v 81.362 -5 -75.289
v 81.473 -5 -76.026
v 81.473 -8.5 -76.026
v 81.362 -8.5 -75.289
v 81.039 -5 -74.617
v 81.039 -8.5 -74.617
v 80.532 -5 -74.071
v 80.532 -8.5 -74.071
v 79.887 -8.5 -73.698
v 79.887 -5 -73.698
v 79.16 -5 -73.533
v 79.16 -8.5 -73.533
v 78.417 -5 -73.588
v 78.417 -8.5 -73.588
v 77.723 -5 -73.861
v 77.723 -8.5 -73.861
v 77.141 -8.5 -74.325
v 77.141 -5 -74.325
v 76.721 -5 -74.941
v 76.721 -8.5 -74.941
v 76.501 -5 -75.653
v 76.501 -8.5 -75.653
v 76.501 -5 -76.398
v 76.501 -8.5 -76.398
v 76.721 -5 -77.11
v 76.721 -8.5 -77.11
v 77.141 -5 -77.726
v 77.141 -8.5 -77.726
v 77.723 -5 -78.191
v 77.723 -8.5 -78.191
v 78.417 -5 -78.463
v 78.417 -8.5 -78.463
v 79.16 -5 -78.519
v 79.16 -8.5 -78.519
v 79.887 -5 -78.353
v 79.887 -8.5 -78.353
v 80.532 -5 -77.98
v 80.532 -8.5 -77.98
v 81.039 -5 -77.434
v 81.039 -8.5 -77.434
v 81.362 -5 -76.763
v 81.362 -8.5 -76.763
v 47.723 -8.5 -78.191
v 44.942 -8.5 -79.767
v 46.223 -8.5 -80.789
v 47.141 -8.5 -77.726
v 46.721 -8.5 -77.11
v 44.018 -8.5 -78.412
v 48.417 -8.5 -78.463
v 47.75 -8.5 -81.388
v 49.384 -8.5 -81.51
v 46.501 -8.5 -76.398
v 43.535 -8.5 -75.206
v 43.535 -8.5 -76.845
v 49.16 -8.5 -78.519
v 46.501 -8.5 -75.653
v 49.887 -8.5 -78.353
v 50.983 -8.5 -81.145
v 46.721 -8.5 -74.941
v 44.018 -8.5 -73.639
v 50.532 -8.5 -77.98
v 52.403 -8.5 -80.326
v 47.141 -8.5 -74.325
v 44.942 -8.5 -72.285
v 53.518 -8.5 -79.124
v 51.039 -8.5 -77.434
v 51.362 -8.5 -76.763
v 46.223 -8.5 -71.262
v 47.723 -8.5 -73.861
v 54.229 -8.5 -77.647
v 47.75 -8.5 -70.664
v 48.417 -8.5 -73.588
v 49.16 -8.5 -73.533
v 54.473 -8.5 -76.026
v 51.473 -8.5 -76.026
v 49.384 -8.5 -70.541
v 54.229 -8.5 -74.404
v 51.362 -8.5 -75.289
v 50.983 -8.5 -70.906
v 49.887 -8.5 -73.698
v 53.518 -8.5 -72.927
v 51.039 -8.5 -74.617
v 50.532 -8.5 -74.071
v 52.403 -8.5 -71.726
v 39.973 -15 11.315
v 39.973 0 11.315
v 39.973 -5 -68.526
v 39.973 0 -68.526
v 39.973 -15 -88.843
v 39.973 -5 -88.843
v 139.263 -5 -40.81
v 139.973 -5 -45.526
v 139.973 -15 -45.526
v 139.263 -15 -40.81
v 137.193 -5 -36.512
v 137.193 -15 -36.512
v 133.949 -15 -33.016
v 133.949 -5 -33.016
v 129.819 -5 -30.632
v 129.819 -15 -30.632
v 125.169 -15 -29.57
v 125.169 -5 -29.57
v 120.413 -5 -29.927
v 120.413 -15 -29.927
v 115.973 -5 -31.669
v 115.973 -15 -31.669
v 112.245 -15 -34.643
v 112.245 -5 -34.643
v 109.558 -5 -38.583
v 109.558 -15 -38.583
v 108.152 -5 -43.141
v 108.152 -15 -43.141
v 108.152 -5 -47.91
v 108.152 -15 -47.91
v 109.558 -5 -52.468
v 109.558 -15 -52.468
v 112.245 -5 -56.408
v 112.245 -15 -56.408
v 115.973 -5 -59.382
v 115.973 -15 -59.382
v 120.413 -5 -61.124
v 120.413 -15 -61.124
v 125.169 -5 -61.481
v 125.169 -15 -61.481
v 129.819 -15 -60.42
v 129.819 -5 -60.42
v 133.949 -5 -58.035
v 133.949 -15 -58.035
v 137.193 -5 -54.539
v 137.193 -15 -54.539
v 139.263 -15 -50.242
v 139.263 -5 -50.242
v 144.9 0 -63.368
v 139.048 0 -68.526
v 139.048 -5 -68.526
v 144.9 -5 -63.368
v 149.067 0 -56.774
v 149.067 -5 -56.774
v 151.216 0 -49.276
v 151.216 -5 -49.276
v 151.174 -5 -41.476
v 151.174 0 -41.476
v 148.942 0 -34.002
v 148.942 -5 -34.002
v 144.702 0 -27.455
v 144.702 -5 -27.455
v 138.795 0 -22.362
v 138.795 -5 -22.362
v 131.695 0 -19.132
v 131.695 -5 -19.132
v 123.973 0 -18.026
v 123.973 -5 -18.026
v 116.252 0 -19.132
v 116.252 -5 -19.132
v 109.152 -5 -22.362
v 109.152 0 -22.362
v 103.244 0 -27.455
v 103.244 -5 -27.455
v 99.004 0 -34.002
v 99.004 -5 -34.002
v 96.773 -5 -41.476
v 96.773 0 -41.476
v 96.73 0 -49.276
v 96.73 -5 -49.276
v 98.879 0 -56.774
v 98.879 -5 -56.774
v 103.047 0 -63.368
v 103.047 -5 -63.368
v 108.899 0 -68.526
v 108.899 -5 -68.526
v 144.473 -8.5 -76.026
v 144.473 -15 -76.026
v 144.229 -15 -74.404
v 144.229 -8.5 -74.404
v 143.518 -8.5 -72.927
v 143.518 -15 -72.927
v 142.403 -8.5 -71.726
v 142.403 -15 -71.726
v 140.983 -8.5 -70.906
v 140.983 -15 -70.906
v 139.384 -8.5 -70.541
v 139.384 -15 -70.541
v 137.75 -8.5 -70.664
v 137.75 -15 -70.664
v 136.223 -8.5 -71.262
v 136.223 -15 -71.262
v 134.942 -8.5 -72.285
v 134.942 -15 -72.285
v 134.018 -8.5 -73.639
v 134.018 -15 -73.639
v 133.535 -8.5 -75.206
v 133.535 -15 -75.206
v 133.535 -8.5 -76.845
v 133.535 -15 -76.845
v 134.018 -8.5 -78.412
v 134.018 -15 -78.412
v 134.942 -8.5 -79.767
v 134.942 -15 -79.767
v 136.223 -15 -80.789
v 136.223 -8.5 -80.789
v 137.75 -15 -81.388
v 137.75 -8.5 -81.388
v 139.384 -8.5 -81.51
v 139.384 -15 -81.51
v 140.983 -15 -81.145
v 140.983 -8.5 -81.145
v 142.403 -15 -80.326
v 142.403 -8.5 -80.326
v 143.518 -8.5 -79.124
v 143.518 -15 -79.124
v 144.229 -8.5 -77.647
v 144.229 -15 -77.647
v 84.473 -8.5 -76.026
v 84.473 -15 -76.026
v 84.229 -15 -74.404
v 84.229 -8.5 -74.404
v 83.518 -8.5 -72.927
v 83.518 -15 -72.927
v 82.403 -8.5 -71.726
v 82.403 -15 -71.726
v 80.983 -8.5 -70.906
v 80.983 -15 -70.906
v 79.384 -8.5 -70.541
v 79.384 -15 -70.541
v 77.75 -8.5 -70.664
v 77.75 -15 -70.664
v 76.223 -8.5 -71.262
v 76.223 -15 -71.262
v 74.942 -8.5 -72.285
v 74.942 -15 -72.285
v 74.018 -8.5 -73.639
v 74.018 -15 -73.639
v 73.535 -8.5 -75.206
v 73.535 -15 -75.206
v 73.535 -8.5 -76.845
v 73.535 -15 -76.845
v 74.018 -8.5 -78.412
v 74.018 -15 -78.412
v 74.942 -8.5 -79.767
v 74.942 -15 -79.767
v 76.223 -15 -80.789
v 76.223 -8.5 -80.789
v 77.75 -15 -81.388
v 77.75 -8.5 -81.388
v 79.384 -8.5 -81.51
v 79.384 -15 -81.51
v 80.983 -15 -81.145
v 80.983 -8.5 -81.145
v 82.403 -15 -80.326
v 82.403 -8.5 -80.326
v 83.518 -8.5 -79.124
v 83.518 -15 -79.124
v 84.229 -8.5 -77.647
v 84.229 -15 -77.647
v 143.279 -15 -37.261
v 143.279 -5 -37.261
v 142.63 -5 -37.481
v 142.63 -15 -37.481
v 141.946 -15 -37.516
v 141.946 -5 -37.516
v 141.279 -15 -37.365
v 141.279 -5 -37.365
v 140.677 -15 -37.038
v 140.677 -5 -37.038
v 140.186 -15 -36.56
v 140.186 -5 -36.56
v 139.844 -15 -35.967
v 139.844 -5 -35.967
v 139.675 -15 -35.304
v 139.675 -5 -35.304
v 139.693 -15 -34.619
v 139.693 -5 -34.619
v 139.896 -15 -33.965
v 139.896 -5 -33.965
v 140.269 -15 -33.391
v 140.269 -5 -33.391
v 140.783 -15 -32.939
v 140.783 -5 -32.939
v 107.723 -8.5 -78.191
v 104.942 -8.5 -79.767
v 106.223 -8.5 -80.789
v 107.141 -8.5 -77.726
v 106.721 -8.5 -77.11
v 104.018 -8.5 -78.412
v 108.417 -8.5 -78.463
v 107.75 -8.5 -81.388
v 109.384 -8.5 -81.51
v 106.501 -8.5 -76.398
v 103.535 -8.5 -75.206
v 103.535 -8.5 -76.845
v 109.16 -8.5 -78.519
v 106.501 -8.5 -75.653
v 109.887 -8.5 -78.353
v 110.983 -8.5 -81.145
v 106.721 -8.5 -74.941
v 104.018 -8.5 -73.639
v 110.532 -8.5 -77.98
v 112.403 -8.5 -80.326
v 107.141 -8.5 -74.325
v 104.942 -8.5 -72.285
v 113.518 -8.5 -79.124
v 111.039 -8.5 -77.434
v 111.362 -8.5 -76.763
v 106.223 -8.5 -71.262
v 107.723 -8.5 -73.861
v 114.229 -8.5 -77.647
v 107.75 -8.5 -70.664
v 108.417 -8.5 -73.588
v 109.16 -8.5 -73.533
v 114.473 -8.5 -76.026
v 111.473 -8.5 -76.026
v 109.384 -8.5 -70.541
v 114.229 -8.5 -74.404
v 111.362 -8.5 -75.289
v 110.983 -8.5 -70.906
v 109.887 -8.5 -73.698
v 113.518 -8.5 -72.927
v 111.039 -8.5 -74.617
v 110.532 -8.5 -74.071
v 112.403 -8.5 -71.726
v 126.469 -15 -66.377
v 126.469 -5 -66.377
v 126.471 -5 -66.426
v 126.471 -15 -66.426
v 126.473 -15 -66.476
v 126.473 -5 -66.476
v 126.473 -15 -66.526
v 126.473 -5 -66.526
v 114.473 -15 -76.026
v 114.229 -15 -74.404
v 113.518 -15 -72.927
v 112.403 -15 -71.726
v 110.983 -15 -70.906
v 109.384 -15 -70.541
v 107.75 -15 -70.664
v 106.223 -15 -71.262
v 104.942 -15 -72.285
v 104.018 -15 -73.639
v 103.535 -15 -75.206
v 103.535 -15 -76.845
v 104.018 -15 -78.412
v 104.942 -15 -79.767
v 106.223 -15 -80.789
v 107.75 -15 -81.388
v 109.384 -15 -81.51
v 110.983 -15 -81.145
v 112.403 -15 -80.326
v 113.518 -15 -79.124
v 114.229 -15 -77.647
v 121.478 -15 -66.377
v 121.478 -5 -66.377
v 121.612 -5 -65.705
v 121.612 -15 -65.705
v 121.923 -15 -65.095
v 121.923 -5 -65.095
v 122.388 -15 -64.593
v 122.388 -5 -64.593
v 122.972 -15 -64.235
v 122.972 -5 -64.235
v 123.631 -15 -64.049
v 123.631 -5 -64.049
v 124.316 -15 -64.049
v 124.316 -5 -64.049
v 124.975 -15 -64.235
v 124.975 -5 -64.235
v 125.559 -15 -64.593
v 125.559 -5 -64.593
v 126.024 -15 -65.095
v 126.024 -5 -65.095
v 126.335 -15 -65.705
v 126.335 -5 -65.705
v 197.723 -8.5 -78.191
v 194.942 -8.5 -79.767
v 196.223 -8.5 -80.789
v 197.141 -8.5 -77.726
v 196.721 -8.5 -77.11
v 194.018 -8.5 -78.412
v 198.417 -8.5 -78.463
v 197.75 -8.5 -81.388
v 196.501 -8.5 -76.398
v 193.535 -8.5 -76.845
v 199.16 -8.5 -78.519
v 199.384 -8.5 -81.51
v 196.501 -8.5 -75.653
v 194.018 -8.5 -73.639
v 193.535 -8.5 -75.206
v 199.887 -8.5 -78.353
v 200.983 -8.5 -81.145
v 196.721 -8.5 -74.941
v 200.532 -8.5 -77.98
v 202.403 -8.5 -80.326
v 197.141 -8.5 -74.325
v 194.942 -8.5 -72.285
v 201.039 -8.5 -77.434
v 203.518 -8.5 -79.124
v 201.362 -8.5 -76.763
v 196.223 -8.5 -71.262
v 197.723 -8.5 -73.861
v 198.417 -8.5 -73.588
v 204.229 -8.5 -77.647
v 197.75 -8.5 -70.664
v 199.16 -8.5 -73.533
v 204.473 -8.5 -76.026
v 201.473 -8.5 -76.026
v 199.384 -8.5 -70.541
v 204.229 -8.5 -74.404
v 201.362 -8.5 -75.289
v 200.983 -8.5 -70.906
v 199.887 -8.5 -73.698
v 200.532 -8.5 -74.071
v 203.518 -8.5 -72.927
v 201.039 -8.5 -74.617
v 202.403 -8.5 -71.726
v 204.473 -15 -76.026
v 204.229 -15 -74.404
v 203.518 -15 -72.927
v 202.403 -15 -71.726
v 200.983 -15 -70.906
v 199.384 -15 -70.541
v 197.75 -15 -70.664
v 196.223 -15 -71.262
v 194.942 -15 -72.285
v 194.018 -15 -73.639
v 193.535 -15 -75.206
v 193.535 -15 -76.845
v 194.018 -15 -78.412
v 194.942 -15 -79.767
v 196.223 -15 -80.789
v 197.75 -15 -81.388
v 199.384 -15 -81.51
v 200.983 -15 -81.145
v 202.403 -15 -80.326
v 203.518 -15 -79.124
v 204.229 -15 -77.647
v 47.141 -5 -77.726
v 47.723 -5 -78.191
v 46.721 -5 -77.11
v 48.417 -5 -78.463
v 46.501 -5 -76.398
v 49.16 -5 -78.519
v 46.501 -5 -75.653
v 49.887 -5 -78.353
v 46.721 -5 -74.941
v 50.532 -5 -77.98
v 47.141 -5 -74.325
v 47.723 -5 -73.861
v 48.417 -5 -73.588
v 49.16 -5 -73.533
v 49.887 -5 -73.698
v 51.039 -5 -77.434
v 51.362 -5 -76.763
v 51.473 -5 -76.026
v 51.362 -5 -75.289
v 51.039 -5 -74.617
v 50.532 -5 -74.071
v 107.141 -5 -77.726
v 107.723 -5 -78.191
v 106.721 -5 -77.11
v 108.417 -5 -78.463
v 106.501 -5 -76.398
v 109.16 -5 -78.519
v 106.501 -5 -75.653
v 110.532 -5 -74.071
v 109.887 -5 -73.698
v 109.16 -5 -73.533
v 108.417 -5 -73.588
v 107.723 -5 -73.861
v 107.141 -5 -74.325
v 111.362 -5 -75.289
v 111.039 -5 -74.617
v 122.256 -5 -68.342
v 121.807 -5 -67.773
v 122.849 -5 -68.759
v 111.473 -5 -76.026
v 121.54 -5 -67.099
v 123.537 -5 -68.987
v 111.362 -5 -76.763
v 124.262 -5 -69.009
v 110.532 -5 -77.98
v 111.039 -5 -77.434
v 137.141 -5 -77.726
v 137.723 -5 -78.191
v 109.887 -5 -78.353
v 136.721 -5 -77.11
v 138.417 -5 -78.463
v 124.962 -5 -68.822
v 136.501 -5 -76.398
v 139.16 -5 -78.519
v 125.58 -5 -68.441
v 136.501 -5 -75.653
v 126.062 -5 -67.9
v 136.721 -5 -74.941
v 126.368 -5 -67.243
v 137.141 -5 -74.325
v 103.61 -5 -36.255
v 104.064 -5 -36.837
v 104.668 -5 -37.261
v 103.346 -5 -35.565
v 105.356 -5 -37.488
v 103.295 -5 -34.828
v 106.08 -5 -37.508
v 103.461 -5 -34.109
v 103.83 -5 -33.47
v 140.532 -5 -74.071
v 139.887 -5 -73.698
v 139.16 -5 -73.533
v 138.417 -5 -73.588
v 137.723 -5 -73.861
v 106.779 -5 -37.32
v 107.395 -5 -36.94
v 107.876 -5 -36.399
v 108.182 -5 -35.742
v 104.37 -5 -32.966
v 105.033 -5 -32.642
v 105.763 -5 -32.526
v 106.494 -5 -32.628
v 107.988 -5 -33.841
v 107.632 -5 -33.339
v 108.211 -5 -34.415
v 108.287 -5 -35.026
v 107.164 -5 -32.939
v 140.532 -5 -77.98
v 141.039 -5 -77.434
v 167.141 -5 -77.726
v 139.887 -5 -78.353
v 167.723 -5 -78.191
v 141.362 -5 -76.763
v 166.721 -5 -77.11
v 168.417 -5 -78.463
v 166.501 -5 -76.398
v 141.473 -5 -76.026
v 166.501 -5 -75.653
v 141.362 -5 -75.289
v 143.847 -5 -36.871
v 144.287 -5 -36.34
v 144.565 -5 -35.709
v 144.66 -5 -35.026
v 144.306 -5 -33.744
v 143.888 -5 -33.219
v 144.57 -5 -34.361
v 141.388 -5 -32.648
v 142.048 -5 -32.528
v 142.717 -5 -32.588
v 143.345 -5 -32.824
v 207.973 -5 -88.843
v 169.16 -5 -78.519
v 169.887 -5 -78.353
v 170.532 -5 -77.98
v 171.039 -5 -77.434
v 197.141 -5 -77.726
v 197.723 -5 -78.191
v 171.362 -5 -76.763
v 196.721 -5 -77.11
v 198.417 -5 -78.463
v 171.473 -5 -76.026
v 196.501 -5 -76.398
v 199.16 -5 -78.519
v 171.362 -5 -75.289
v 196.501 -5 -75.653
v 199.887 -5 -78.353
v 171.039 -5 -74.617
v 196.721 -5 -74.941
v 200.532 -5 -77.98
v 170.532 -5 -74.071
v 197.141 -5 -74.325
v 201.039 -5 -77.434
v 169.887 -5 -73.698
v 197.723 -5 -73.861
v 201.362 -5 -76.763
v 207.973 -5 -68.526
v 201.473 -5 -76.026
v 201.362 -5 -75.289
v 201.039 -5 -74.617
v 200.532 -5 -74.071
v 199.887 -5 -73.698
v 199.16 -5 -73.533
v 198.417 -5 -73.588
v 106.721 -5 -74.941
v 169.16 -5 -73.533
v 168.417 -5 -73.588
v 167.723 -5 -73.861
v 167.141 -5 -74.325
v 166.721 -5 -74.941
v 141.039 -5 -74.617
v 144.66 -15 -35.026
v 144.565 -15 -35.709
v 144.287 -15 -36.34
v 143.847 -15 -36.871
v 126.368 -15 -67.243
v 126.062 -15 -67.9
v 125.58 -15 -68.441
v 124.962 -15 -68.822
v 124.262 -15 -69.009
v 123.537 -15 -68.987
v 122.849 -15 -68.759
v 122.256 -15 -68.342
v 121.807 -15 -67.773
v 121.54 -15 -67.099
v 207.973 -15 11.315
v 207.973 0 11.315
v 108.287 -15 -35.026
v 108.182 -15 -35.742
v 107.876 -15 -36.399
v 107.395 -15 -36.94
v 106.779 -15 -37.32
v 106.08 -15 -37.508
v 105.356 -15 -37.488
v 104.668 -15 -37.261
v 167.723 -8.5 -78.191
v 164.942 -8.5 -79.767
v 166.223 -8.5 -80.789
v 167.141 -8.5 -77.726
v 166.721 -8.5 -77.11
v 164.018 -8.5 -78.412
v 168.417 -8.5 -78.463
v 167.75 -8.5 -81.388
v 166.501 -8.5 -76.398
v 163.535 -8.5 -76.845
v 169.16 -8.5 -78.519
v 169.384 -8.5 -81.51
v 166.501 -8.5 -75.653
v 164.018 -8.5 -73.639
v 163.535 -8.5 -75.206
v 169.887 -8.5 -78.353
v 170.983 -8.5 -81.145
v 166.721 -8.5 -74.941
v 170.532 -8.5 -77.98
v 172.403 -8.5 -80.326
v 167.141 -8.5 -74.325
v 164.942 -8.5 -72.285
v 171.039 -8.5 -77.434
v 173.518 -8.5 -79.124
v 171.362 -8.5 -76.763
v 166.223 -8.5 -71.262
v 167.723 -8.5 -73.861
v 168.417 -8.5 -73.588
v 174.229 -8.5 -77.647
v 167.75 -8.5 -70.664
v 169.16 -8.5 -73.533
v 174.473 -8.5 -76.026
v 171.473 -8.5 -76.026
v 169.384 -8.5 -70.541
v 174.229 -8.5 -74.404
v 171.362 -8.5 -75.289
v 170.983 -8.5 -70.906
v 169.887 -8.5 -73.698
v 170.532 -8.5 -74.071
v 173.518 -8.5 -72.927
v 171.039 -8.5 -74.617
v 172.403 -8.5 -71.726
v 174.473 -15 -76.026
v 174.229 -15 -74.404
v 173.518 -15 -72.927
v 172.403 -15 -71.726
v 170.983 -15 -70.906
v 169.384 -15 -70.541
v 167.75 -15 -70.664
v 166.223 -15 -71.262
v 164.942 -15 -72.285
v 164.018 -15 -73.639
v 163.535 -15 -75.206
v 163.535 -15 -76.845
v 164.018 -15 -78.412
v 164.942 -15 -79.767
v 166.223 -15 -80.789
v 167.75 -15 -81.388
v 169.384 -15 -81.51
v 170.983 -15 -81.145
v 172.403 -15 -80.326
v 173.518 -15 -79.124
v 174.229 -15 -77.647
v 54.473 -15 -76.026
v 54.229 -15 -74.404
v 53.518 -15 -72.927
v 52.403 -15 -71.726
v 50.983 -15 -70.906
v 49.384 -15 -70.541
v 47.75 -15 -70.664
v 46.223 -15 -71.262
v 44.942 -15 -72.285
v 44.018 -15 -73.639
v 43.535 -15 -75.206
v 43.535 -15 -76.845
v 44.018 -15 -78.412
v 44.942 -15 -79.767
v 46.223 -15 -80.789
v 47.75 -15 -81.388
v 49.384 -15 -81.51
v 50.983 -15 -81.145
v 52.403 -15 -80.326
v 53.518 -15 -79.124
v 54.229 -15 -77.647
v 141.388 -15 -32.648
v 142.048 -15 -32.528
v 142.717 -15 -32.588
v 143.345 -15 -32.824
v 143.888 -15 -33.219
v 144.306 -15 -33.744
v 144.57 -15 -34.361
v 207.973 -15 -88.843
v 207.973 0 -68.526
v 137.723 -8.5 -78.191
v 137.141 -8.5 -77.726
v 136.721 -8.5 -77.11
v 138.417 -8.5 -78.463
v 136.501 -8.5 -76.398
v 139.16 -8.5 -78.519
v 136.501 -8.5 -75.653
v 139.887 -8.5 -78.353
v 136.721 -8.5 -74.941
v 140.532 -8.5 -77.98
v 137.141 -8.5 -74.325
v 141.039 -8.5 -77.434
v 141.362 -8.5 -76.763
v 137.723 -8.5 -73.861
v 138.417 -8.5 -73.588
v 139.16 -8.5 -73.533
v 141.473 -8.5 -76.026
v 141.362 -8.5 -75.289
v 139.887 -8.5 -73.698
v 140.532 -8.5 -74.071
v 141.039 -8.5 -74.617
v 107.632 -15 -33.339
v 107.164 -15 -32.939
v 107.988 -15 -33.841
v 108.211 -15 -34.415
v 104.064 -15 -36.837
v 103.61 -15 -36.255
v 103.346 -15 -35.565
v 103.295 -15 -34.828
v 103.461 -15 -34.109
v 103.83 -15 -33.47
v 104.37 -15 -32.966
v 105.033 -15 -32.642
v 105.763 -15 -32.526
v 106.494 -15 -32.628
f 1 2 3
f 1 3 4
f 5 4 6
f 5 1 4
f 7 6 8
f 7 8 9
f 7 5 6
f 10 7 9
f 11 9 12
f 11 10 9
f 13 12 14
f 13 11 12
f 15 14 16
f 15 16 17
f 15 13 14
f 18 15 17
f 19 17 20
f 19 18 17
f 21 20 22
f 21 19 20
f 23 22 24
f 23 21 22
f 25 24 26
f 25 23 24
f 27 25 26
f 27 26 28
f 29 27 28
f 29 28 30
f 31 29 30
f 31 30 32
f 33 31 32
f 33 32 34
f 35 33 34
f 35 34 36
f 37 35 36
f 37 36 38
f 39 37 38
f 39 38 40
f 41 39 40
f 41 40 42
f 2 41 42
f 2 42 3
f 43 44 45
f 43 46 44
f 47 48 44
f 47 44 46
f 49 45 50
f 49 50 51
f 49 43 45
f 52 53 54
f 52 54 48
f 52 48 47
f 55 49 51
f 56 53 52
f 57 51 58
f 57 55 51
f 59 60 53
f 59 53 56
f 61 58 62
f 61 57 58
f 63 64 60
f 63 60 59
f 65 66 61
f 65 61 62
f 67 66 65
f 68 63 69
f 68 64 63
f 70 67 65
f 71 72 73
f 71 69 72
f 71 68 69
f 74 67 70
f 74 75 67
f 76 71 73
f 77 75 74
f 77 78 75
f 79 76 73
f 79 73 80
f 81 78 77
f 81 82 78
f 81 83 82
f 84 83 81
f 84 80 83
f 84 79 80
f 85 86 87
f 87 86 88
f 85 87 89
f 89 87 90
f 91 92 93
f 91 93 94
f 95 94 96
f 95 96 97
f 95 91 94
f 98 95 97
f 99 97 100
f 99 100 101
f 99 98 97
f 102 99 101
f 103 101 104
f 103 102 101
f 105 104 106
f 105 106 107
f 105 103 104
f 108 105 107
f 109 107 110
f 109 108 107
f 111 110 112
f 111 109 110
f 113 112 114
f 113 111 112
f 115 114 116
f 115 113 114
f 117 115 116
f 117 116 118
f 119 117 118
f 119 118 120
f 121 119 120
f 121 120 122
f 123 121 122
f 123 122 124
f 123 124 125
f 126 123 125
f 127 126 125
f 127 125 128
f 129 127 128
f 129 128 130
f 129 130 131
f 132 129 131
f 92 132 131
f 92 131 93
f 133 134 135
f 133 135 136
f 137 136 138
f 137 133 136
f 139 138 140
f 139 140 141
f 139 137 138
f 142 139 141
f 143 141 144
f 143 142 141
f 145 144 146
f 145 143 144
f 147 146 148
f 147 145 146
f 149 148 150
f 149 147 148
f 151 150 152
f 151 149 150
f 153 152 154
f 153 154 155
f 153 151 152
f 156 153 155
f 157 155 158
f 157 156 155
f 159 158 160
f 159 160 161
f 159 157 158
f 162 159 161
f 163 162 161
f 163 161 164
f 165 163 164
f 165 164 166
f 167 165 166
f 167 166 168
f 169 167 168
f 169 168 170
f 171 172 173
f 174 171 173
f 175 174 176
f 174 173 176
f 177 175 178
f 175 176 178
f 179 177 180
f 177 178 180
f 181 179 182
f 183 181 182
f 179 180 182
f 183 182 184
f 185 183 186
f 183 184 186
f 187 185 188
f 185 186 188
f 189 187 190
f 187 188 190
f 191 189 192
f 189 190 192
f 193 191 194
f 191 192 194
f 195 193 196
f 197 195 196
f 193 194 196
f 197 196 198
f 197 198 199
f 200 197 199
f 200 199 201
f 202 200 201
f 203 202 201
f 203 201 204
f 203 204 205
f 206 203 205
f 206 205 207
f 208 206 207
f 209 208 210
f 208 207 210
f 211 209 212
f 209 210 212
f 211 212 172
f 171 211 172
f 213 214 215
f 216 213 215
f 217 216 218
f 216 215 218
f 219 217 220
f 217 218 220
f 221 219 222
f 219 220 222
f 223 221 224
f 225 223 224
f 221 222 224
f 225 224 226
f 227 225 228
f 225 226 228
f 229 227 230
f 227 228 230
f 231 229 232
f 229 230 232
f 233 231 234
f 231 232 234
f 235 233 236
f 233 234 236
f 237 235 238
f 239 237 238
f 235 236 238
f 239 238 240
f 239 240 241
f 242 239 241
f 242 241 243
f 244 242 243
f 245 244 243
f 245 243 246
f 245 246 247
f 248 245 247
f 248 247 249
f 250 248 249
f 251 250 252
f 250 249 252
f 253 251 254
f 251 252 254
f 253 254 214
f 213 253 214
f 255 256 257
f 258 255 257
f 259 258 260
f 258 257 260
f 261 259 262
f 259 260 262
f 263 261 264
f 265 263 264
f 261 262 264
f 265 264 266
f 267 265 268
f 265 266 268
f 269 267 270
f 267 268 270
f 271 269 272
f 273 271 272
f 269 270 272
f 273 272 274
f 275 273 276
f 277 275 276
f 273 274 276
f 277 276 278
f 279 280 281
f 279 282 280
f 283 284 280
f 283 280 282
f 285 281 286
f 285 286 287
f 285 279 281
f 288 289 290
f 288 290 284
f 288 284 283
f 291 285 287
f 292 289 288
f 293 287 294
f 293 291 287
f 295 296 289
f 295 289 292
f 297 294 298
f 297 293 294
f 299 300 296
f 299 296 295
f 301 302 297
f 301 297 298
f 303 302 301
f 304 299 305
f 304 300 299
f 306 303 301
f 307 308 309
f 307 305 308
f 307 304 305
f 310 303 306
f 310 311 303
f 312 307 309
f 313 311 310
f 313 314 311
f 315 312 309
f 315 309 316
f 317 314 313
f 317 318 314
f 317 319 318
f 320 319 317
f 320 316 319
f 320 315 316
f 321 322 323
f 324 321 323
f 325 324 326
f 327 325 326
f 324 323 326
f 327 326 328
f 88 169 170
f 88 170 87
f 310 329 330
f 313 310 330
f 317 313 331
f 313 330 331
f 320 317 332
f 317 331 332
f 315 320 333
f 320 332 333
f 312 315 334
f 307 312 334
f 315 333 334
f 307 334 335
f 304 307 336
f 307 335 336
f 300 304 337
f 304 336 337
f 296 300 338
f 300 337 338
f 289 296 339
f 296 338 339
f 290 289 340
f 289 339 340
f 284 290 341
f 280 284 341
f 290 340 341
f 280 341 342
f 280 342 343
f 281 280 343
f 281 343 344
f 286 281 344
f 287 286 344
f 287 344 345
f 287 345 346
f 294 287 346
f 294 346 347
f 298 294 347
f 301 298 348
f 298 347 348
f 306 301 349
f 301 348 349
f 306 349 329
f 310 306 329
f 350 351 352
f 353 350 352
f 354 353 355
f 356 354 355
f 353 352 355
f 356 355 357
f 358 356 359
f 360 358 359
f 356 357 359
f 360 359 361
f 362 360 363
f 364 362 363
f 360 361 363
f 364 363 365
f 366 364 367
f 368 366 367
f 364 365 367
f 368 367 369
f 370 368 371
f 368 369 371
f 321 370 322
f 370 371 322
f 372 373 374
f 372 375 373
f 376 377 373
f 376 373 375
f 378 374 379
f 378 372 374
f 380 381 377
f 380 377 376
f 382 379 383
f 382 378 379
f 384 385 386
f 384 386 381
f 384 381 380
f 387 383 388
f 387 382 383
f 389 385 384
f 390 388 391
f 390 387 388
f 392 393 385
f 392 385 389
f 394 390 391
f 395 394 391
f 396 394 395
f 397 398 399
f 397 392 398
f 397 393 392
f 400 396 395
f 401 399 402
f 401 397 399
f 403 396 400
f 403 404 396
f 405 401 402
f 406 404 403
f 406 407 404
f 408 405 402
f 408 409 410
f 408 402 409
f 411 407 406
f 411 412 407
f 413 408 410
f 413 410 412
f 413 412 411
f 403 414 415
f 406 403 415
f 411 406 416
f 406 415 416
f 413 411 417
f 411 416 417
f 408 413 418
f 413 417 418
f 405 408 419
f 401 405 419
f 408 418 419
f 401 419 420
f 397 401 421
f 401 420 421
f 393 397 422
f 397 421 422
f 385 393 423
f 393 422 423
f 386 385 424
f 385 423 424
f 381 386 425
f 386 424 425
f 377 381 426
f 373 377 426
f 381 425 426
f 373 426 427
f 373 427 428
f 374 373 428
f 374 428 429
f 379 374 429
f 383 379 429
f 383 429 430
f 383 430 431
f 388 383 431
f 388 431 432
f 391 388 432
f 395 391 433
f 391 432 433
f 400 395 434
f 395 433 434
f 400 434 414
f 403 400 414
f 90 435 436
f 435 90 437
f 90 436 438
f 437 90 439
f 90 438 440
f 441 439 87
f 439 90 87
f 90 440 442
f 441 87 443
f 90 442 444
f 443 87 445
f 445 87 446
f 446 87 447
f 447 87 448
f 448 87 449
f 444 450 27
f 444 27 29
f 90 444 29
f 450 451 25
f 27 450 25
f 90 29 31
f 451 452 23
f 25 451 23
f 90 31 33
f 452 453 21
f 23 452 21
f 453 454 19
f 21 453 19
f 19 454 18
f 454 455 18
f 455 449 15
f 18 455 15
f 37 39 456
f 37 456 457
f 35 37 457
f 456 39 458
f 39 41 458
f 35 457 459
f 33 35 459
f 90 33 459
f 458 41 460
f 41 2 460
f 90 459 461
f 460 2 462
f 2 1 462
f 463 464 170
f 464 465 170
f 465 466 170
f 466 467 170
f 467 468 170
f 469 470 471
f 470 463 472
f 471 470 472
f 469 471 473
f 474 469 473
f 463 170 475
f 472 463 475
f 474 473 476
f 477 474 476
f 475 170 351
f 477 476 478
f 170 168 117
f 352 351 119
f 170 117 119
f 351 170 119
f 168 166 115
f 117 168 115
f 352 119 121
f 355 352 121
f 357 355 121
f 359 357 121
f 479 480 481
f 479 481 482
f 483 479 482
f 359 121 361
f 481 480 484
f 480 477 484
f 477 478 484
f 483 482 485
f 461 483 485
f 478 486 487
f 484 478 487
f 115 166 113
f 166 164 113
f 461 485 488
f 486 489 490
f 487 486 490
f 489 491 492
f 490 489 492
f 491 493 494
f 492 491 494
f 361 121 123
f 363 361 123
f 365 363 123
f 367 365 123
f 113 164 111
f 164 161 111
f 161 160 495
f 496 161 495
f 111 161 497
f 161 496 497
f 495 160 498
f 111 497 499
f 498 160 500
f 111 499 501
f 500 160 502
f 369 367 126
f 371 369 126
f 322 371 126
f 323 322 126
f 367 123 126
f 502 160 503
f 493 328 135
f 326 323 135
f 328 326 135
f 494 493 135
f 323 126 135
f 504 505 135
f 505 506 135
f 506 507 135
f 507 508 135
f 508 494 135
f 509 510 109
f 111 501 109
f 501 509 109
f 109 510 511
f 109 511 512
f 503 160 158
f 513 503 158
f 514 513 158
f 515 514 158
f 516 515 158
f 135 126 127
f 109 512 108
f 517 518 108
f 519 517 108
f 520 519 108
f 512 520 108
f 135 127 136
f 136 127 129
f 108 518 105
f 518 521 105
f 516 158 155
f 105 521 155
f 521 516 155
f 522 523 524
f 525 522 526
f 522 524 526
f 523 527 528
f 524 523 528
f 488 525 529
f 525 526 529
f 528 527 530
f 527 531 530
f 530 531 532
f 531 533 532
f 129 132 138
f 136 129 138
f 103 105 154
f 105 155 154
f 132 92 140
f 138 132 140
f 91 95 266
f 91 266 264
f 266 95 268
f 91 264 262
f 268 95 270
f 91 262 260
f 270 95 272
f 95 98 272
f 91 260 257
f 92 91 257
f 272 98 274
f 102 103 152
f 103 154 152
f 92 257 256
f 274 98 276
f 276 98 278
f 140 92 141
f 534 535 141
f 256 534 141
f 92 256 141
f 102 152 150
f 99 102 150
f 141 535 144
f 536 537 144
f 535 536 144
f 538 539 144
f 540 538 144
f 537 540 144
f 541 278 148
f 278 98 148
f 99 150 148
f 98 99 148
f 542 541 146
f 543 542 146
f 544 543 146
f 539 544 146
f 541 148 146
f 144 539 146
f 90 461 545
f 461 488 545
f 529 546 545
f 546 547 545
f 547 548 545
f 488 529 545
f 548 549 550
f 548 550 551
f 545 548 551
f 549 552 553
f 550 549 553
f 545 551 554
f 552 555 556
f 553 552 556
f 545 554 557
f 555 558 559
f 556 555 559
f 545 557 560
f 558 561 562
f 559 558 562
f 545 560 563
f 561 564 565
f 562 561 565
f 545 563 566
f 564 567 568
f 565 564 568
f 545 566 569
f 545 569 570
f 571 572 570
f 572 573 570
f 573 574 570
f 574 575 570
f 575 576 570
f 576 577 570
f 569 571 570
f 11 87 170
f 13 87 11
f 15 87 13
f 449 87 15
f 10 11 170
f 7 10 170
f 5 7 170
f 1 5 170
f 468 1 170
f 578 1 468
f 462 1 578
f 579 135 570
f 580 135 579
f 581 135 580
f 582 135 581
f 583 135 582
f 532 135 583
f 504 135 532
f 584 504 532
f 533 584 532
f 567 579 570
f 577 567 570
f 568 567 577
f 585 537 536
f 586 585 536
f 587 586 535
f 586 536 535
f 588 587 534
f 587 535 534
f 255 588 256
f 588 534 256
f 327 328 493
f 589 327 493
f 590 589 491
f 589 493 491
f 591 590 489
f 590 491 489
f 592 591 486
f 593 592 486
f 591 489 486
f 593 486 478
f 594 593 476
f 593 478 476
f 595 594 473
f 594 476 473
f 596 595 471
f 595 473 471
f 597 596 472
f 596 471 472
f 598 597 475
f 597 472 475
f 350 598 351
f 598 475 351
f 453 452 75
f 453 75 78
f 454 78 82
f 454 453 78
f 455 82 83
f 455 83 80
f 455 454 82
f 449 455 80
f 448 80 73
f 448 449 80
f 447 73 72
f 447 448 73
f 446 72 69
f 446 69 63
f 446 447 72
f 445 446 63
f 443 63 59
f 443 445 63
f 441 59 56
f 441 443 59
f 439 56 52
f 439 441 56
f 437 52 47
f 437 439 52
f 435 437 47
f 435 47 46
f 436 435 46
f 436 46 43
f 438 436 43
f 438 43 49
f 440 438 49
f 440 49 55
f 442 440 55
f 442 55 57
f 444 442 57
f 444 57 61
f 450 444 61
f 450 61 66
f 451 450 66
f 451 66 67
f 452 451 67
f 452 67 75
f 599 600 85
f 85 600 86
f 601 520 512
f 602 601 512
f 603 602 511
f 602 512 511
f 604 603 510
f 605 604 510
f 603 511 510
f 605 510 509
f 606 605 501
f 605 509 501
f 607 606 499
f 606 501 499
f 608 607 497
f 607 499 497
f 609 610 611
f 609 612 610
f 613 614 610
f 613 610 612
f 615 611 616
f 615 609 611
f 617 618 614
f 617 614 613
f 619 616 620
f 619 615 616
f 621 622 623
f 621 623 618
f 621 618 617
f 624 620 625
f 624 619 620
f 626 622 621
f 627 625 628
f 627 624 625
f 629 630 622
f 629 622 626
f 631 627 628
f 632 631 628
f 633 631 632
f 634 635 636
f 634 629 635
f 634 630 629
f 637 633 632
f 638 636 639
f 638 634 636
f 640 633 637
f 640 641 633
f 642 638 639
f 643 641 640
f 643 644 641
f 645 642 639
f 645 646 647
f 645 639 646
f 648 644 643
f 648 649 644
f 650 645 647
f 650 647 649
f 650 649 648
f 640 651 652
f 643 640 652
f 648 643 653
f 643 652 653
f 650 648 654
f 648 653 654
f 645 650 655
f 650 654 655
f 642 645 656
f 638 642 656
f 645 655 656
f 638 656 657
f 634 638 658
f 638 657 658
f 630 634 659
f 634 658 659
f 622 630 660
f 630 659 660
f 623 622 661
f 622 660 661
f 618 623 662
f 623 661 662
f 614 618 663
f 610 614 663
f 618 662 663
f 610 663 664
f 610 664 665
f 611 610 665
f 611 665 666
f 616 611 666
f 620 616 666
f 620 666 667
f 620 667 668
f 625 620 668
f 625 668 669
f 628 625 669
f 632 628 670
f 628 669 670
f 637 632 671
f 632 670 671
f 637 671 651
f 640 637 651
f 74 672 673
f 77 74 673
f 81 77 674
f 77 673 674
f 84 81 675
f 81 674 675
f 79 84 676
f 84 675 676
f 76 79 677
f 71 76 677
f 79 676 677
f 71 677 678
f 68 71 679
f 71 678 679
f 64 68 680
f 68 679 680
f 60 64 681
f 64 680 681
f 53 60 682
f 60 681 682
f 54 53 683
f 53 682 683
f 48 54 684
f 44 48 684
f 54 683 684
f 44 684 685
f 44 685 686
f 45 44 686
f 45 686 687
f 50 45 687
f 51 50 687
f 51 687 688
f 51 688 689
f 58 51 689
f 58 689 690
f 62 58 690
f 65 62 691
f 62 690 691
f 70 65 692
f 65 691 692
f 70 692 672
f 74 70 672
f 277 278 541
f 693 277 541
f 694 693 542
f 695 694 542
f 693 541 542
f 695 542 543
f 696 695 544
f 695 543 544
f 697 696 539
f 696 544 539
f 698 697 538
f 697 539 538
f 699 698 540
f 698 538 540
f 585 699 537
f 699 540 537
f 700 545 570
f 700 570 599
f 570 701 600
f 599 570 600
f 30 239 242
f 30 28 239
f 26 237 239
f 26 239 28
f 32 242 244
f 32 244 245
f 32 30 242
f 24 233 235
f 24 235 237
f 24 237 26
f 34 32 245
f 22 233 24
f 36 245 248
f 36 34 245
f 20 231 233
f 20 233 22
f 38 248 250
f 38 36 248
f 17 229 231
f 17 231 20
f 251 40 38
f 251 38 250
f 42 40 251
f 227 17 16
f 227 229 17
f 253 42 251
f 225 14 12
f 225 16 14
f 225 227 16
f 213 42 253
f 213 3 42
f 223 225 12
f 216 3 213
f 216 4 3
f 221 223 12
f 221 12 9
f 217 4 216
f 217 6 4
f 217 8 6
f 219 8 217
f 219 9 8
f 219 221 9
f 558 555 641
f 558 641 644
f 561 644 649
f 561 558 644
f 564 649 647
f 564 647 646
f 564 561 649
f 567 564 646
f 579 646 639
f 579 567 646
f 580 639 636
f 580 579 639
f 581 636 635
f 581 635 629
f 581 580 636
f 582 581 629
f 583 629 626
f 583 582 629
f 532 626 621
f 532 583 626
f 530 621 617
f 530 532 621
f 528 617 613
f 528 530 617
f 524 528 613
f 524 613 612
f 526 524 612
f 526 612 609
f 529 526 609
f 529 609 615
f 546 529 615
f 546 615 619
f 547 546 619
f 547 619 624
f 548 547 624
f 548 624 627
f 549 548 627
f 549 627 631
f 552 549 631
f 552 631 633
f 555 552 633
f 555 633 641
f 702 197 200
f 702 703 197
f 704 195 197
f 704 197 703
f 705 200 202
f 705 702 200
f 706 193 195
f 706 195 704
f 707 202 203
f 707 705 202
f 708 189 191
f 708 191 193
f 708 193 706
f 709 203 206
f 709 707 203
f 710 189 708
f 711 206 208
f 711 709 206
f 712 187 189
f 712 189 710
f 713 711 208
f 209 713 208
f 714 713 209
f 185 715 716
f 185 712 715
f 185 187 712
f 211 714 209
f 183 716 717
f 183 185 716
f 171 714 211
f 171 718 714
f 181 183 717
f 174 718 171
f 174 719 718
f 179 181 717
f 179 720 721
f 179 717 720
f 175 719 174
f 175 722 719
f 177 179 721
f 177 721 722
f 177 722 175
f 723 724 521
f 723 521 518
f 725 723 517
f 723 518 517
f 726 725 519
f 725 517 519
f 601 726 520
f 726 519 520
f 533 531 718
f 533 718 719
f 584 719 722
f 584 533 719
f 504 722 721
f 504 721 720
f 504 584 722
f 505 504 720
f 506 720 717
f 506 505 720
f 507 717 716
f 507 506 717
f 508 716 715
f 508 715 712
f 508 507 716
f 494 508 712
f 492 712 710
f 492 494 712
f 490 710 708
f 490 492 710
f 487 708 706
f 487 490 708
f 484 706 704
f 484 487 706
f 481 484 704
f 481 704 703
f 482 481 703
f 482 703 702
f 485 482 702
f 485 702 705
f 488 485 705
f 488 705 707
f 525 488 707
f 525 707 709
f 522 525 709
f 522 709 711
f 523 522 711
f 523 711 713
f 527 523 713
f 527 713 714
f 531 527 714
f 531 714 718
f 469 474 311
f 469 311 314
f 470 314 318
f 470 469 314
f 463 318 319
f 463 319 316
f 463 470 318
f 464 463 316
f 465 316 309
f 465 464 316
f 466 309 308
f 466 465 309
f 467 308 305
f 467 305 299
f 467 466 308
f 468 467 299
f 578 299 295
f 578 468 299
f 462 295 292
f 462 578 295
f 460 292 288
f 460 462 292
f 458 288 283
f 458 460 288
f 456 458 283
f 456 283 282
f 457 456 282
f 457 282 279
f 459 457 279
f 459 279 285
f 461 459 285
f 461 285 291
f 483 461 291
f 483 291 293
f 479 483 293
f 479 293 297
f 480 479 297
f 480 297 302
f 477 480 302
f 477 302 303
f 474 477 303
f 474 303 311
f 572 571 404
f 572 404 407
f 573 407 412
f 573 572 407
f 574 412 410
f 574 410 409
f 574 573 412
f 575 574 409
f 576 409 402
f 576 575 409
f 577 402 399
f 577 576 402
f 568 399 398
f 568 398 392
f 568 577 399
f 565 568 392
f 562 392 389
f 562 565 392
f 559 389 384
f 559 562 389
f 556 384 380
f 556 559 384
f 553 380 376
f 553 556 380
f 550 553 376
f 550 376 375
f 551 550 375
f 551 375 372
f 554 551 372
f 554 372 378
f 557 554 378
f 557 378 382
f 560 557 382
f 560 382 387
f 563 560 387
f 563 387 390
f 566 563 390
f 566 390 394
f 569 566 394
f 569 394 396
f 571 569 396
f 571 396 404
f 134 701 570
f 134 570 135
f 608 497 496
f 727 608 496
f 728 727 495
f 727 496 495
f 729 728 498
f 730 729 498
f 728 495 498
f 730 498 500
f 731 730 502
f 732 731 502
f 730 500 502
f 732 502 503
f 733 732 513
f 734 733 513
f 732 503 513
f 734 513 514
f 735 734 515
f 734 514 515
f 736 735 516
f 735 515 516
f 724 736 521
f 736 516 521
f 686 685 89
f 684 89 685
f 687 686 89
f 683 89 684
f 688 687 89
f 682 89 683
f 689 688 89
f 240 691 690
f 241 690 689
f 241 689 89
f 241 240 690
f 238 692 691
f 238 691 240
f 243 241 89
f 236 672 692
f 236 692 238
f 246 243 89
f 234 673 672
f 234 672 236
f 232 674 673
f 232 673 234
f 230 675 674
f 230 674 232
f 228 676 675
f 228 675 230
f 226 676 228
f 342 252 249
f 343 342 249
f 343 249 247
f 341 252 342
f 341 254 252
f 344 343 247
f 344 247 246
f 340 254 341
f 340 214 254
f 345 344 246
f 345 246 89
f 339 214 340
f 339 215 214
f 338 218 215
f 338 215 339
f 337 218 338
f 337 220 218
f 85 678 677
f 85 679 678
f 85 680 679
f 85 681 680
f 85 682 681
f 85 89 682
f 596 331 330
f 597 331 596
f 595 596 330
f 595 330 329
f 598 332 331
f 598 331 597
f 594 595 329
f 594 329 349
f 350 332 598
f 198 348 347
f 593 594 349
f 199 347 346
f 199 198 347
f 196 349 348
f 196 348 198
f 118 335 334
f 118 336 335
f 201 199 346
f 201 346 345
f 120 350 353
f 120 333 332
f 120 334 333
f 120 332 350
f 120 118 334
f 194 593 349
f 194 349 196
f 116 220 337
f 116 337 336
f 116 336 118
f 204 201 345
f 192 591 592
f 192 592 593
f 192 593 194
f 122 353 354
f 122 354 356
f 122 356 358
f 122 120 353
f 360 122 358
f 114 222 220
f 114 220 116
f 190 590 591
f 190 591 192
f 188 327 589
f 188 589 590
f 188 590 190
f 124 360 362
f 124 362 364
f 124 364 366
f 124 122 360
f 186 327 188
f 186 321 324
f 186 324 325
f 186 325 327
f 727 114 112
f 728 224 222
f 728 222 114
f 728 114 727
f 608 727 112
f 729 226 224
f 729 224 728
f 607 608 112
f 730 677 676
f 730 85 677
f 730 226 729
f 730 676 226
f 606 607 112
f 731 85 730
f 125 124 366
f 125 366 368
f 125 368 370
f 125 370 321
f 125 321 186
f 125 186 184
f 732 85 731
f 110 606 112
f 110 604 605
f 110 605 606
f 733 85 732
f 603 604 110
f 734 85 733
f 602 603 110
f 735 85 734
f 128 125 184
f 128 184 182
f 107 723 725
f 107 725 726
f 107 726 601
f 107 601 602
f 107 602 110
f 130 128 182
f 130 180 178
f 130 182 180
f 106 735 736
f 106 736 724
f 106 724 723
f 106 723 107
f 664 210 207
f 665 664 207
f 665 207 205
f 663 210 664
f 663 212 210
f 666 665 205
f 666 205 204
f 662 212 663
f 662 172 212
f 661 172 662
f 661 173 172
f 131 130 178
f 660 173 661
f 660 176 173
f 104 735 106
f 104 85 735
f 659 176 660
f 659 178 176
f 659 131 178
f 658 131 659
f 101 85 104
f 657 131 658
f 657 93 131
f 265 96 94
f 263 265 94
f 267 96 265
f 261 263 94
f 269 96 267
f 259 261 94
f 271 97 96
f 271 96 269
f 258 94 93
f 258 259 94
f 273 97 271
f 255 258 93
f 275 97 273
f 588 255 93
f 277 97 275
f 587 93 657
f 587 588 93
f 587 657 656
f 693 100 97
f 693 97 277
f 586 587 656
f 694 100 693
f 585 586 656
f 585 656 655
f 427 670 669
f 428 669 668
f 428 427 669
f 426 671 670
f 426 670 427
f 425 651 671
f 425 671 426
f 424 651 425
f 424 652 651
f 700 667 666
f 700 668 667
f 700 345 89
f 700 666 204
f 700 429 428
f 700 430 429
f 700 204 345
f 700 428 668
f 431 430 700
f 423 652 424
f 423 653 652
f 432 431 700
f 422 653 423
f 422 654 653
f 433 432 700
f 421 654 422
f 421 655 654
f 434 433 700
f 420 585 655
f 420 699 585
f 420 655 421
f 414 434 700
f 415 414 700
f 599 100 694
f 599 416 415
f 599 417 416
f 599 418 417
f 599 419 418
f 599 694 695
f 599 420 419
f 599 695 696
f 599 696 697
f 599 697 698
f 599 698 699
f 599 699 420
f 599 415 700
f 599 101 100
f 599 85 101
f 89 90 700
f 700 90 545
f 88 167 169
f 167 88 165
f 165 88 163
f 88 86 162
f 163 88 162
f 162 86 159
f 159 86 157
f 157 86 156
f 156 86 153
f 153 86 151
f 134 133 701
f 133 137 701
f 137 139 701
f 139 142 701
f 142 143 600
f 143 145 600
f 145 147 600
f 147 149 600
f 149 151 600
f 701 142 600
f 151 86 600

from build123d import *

# Parameters (mm, degrees)
F0_R     = 16
F0_R_2   = 2.5
F1_DEPTH = 15
F2_DEPTH = 5
F3_R     = 5.5
F3_R_2   = 2.5
F4_DEPTH = 6.5


# Not quite as in the source:
# - a feature names something its author has since deleted; it is built from what else it names


with BuildPart() as f1:
    # F0 (on Front) → F1 (new body)
    with BuildSketch(Plane.XZ):
        with BuildLine():
            ThreePointArc((139.0482066844, -68.5256164076), (148.1685102123, -58.5964356365), (151.4733932528, -45.5256164076))
            ThreePointArc((151.4733932528, -45.5256164076), (110.9025740239, -21.3304994481), (108.8985798211, -68.5256164076))
            ThreePointArc((108.8985798211, -68.5256164076), (123.9733932528, -73.0256164076), (139.0482066844, -68.5256164076))
        make_face()
        with BuildLine():
            ThreePointArc((104.6679489936, -37.2612457748), (103.6217962638, -33.7756164076), (107.1635162088, -32.9387965643))
            ThreePointArc((107.1635162088, -32.9387965643), (123.9733932528, -24.5256164076), (140.7832702967, -32.9387965643))
            ThreePointArc((140.7832702967, -32.9387965643), (143.344907515, -32.8242939541), (144.6599267322, -35.0256164076))
            ThreePointArc((144.6599267322, -35.0256164076), (144.2868114199, -36.3395271829), (143.2788375119, -37.2612457748))
            ThreePointArc((143.2788375119, -37.2612457748), (144.5453927842, -41.307460972), (144.9733932528, -45.5256164076))
            ThreePointArc((144.9733932528, -45.5256164076), (139.6801897358, -59.4646459377), (126.468960468, -66.3768068838))
            ThreePointArc((126.468960468, -66.3768068838), (126.4722848108, -66.4511786418), (126.4733932528, -66.5256164076))
            ThreePointArc((126.4733932528, -66.5256164076), (123.8989554869, -69.0245079657), (121.4778260376, -66.3768068838))
            ThreePointArc((121.4778260376, -66.3768068838), (105.7868597733, -56.0256164076), (104.6679489936, -37.2612457748))
        make_face(mode=Mode.SUBTRACT)
        with BuildLine():
            ThreePointArc((107.1635162088, -32.9387965643), (107.9881822268, -33.8406356249), (108.2868597733, -35.0256164076))
            ThreePointArc((108.2868597733, -35.0256164076), (107.1007705486, -37.1525010953), (104.6679489936, -37.2612457748))
            ThreePointArc((104.6679489936, -37.2612457748), (105.7868597733, -56.0256164076), (121.4778260376, -66.3768068838))
            ThreePointArc((121.4778260376, -66.3768068838), (123.9733932528, -64.0256164076), (126.468960468, -66.3768068838))
            ThreePointArc((126.468960468, -66.3768068838), (139.6801897358, -59.4646459377), (144.9733932528, -45.5256164076))
            ThreePointArc((144.9733932528, -45.5256164076), (144.5453927842, -41.307460972), (143.2788375119, -37.2612457748))
            ThreePointArc((143.2788375119, -37.2612457748), (139.9948632228, -36.2756164076), (140.7832702967, -32.9387965643))
            ThreePointArc((140.7832702967, -32.9387965643), (123.9733932528, -24.5256164076), (107.1635162088, -32.9387965643))
        make_face()
        with Locations((123.9733932528, -45.5256164076)):
            Circle(F0_R, mode=Mode.SUBTRACT)
        with BuildLine():
            ThreePointArc((108.8985798211, -68.5256164076), (110.9025740239, -21.3304994481), (151.4733932528, -45.5256164076))
            ThreePointArc((151.4733932528, -45.5256164076), (148.1685102123, -58.5964356365), (139.0482066844, -68.5256164076))
            Line((139.0482066844, -68.5256164076), (207.9733932528, -68.5256164076))
            Line((207.9733932528, -68.5256164076), (207.9733932528, 11.3154806698))
            Line((207.9733932528, 11.3154806698), (39.9733932528, 11.3154806698))
            Line((39.9733932528, 11.3154806698), (39.9733932528, -68.5256164076))
            Line((39.9733932528, -68.5256164076), (108.8985798211, -68.5256164076))
        make_face()
        with BuildLine():
            ThreePointArc((139.0482066844, -68.5256164076), (123.9733932528, -73.0256164076), (108.8985798211, -68.5256164076))
            Line((108.8985798211, -68.5256164076), (39.9733932528, -68.5256164076))
            Line((39.9733932528, -68.5256164076), (39.9733932528, -88.8428396075))
            Line((39.9733932528, -88.8428396075), (207.9733932528, -88.8428396075))
            Line((207.9733932528, -88.8428396075), (207.9733932528, -68.5256164076))
            Line((207.9733932528, -68.5256164076), (139.0482066844, -68.5256164076))
        make_face()
        with Locations((48.9733932528, -76.0256164076)):
            Circle(F0_R_2, mode=Mode.SUBTRACT)
        with Locations((78.9733932528, -76.0256164076)):
            Circle(F0_R_2, mode=Mode.SUBTRACT)
        with Locations((108.9733932528, -76.0256164076)):
            Circle(F0_R_2, mode=Mode.SUBTRACT)
        with Locations((138.9733932528, -76.0256164076)):
            Circle(F0_R_2, mode=Mode.SUBTRACT)
        with Locations((168.9733932528, -76.0256164076)):
            Circle(F0_R_2, mode=Mode.SUBTRACT)
        with Locations((198.9733932528, -76.0256164076)):
            Circle(F0_R_2, mode=Mode.SUBTRACT)
    extrude(amount=F1_DEPTH)

    # F0 (on Front) → F2 (cut)
    with BuildSketch(Plane.XZ):
        with BuildLine():
            ThreePointArc((139.0482066844, -68.5256164076), (148.1685102123, -58.5964356365), (151.4733932528, -45.5256164076))
            ThreePointArc((151.4733932528, -45.5256164076), (110.9025740239, -21.3304994481), (108.8985798211, -68.5256164076))
            ThreePointArc((108.8985798211, -68.5256164076), (123.9733932528, -73.0256164076), (139.0482066844, -68.5256164076))
        make_face()
        with BuildLine():
            ThreePointArc((104.6679489936, -37.2612457748), (103.6217962638, -33.7756164076), (107.1635162088, -32.9387965643))
            ThreePointArc((107.1635162088, -32.9387965643), (123.9733932528, -24.5256164076), (140.7832702967, -32.9387965643))
            ThreePointArc((140.7832702967, -32.9387965643), (143.344907515, -32.8242939541), (144.6599267322, -35.0256164076))
            ThreePointArc((144.6599267322, -35.0256164076), (144.2868114199, -36.3395271829), (143.2788375119, -37.2612457748))
            ThreePointArc((143.2788375119, -37.2612457748), (144.5453927842, -41.307460972), (144.9733932528, -45.5256164076))
            ThreePointArc((144.9733932528, -45.5256164076), (139.6801897358, -59.4646459377), (126.468960468, -66.3768068838))
            ThreePointArc((126.468960468, -66.3768068838), (126.4722848108, -66.4511786418), (126.4733932528, -66.5256164076))
            ThreePointArc((126.4733932528, -66.5256164076), (123.8989554869, -69.0245079657), (121.4778260376, -66.3768068838))
            ThreePointArc((121.4778260376, -66.3768068838), (105.7868597733, -56.0256164076), (104.6679489936, -37.2612457748))
        make_face(mode=Mode.SUBTRACT)
        with BuildLine():
            ThreePointArc((107.1635162088, -32.9387965643), (107.9881822268, -33.8406356249), (108.2868597733, -35.0256164076))
            ThreePointArc((108.2868597733, -35.0256164076), (107.1007705486, -37.1525010953), (104.6679489936, -37.2612457748))
            ThreePointArc((104.6679489936, -37.2612457748), (105.7868597733, -56.0256164076), (121.4778260376, -66.3768068838))
            ThreePointArc((121.4778260376, -66.3768068838), (123.9733932528, -64.0256164076), (126.468960468, -66.3768068838))
            ThreePointArc((126.468960468, -66.3768068838), (139.6801897358, -59.4646459377), (144.9733932528, -45.5256164076))
            ThreePointArc((144.9733932528, -45.5256164076), (144.5453927842, -41.307460972), (143.2788375119, -37.2612457748))
            ThreePointArc((143.2788375119, -37.2612457748), (139.9948632228, -36.2756164076), (140.7832702967, -32.9387965643))
            ThreePointArc((140.7832702967, -32.9387965643), (123.9733932528, -24.5256164076), (107.1635162088, -32.9387965643))
        make_face()
        with Locations((123.9733932528, -45.5256164076)):
            Circle(F0_R, mode=Mode.SUBTRACT)
        with BuildLine():
            ThreePointArc((139.0482066844, -68.5256164076), (123.9733932528, -73.0256164076), (108.8985798211, -68.5256164076))
            Line((108.8985798211, -68.5256164076), (39.9733932528, -68.5256164076))
            Line((39.9733932528, -68.5256164076), (39.9733932528, -88.8428396075))
            Line((39.9733932528, -88.8428396075), (207.9733932528, -88.8428396075))
            Line((207.9733932528, -88.8428396075), (207.9733932528, -68.5256164076))
            Line((207.9733932528, -68.5256164076), (139.0482066844, -68.5256164076))
        make_face()
        with Locations((48.9733932528, -76.0256164076)):
            Circle(F0_R_2, mode=Mode.SUBTRACT)
        with Locations((78.9733932528, -76.0256164076)):
            Circle(F0_R_2, mode=Mode.SUBTRACT)
        with Locations((108.9733932528, -76.0256164076)):
            Circle(F0_R_2, mode=Mode.SUBTRACT)
        with Locations((138.9733932528, -76.0256164076)):
            Circle(F0_R_2, mode=Mode.SUBTRACT)
        with Locations((168.9733932528, -76.0256164076)):
            Circle(F0_R_2, mode=Mode.SUBTRACT)
        with Locations((198.9733932528, -76.0256164076)):
            Circle(F0_R_2, mode=Mode.SUBTRACT)
    extrude(amount=F2_DEPTH, mode=Mode.SUBTRACT)

    # F3 (on face) → F4 (cut)
    with BuildSketch(Plane.XZ.offset(15)):
        with Locations((198.9733932528, -76.0256164076)):
            Circle(F3_R)
        with Locations((198.9733932528, -76.0256164076)):
            Circle(F3_R_2, mode=Mode.SUBTRACT)
        with Locations((168.9733932528, -76.0256164076)):
            Circle(F3_R)
        with Locations((168.9733932528, -76.0256164076)):
            Circle(F3_R_2, mode=Mode.SUBTRACT)
        with Locations((138.9733932528, -76.0256164076)):
            Circle(F3_R)
        with Locations((138.9733932528, -76.0256164076)):
            Circle(F3_R_2, mode=Mode.SUBTRACT)
        with Locations((108.9733932528, -76.0256164076)):
            Circle(F3_R)
        with Locations((108.9733932528, -76.0256164076)):
            Circle(F3_R_2, mode=Mode.SUBTRACT)
        with Locations((78.9733932528, -76.0256164076)):
            Circle(F3_R)
        with Locations((78.9733932528, -76.0256164076)):
            Circle(F3_R_2, mode=Mode.SUBTRACT)
        with Locations((48.9733932528, -76.0256164076)):
            Circle(F3_R)
        with Locations((48.9733932528, -76.0256164076)):
            Circle(F3_R_2, mode=Mode.SUBTRACT)
    extrude(amount=-F4_DEPTH, mode=Mode.SUBTRACT)


solid = f1.part
